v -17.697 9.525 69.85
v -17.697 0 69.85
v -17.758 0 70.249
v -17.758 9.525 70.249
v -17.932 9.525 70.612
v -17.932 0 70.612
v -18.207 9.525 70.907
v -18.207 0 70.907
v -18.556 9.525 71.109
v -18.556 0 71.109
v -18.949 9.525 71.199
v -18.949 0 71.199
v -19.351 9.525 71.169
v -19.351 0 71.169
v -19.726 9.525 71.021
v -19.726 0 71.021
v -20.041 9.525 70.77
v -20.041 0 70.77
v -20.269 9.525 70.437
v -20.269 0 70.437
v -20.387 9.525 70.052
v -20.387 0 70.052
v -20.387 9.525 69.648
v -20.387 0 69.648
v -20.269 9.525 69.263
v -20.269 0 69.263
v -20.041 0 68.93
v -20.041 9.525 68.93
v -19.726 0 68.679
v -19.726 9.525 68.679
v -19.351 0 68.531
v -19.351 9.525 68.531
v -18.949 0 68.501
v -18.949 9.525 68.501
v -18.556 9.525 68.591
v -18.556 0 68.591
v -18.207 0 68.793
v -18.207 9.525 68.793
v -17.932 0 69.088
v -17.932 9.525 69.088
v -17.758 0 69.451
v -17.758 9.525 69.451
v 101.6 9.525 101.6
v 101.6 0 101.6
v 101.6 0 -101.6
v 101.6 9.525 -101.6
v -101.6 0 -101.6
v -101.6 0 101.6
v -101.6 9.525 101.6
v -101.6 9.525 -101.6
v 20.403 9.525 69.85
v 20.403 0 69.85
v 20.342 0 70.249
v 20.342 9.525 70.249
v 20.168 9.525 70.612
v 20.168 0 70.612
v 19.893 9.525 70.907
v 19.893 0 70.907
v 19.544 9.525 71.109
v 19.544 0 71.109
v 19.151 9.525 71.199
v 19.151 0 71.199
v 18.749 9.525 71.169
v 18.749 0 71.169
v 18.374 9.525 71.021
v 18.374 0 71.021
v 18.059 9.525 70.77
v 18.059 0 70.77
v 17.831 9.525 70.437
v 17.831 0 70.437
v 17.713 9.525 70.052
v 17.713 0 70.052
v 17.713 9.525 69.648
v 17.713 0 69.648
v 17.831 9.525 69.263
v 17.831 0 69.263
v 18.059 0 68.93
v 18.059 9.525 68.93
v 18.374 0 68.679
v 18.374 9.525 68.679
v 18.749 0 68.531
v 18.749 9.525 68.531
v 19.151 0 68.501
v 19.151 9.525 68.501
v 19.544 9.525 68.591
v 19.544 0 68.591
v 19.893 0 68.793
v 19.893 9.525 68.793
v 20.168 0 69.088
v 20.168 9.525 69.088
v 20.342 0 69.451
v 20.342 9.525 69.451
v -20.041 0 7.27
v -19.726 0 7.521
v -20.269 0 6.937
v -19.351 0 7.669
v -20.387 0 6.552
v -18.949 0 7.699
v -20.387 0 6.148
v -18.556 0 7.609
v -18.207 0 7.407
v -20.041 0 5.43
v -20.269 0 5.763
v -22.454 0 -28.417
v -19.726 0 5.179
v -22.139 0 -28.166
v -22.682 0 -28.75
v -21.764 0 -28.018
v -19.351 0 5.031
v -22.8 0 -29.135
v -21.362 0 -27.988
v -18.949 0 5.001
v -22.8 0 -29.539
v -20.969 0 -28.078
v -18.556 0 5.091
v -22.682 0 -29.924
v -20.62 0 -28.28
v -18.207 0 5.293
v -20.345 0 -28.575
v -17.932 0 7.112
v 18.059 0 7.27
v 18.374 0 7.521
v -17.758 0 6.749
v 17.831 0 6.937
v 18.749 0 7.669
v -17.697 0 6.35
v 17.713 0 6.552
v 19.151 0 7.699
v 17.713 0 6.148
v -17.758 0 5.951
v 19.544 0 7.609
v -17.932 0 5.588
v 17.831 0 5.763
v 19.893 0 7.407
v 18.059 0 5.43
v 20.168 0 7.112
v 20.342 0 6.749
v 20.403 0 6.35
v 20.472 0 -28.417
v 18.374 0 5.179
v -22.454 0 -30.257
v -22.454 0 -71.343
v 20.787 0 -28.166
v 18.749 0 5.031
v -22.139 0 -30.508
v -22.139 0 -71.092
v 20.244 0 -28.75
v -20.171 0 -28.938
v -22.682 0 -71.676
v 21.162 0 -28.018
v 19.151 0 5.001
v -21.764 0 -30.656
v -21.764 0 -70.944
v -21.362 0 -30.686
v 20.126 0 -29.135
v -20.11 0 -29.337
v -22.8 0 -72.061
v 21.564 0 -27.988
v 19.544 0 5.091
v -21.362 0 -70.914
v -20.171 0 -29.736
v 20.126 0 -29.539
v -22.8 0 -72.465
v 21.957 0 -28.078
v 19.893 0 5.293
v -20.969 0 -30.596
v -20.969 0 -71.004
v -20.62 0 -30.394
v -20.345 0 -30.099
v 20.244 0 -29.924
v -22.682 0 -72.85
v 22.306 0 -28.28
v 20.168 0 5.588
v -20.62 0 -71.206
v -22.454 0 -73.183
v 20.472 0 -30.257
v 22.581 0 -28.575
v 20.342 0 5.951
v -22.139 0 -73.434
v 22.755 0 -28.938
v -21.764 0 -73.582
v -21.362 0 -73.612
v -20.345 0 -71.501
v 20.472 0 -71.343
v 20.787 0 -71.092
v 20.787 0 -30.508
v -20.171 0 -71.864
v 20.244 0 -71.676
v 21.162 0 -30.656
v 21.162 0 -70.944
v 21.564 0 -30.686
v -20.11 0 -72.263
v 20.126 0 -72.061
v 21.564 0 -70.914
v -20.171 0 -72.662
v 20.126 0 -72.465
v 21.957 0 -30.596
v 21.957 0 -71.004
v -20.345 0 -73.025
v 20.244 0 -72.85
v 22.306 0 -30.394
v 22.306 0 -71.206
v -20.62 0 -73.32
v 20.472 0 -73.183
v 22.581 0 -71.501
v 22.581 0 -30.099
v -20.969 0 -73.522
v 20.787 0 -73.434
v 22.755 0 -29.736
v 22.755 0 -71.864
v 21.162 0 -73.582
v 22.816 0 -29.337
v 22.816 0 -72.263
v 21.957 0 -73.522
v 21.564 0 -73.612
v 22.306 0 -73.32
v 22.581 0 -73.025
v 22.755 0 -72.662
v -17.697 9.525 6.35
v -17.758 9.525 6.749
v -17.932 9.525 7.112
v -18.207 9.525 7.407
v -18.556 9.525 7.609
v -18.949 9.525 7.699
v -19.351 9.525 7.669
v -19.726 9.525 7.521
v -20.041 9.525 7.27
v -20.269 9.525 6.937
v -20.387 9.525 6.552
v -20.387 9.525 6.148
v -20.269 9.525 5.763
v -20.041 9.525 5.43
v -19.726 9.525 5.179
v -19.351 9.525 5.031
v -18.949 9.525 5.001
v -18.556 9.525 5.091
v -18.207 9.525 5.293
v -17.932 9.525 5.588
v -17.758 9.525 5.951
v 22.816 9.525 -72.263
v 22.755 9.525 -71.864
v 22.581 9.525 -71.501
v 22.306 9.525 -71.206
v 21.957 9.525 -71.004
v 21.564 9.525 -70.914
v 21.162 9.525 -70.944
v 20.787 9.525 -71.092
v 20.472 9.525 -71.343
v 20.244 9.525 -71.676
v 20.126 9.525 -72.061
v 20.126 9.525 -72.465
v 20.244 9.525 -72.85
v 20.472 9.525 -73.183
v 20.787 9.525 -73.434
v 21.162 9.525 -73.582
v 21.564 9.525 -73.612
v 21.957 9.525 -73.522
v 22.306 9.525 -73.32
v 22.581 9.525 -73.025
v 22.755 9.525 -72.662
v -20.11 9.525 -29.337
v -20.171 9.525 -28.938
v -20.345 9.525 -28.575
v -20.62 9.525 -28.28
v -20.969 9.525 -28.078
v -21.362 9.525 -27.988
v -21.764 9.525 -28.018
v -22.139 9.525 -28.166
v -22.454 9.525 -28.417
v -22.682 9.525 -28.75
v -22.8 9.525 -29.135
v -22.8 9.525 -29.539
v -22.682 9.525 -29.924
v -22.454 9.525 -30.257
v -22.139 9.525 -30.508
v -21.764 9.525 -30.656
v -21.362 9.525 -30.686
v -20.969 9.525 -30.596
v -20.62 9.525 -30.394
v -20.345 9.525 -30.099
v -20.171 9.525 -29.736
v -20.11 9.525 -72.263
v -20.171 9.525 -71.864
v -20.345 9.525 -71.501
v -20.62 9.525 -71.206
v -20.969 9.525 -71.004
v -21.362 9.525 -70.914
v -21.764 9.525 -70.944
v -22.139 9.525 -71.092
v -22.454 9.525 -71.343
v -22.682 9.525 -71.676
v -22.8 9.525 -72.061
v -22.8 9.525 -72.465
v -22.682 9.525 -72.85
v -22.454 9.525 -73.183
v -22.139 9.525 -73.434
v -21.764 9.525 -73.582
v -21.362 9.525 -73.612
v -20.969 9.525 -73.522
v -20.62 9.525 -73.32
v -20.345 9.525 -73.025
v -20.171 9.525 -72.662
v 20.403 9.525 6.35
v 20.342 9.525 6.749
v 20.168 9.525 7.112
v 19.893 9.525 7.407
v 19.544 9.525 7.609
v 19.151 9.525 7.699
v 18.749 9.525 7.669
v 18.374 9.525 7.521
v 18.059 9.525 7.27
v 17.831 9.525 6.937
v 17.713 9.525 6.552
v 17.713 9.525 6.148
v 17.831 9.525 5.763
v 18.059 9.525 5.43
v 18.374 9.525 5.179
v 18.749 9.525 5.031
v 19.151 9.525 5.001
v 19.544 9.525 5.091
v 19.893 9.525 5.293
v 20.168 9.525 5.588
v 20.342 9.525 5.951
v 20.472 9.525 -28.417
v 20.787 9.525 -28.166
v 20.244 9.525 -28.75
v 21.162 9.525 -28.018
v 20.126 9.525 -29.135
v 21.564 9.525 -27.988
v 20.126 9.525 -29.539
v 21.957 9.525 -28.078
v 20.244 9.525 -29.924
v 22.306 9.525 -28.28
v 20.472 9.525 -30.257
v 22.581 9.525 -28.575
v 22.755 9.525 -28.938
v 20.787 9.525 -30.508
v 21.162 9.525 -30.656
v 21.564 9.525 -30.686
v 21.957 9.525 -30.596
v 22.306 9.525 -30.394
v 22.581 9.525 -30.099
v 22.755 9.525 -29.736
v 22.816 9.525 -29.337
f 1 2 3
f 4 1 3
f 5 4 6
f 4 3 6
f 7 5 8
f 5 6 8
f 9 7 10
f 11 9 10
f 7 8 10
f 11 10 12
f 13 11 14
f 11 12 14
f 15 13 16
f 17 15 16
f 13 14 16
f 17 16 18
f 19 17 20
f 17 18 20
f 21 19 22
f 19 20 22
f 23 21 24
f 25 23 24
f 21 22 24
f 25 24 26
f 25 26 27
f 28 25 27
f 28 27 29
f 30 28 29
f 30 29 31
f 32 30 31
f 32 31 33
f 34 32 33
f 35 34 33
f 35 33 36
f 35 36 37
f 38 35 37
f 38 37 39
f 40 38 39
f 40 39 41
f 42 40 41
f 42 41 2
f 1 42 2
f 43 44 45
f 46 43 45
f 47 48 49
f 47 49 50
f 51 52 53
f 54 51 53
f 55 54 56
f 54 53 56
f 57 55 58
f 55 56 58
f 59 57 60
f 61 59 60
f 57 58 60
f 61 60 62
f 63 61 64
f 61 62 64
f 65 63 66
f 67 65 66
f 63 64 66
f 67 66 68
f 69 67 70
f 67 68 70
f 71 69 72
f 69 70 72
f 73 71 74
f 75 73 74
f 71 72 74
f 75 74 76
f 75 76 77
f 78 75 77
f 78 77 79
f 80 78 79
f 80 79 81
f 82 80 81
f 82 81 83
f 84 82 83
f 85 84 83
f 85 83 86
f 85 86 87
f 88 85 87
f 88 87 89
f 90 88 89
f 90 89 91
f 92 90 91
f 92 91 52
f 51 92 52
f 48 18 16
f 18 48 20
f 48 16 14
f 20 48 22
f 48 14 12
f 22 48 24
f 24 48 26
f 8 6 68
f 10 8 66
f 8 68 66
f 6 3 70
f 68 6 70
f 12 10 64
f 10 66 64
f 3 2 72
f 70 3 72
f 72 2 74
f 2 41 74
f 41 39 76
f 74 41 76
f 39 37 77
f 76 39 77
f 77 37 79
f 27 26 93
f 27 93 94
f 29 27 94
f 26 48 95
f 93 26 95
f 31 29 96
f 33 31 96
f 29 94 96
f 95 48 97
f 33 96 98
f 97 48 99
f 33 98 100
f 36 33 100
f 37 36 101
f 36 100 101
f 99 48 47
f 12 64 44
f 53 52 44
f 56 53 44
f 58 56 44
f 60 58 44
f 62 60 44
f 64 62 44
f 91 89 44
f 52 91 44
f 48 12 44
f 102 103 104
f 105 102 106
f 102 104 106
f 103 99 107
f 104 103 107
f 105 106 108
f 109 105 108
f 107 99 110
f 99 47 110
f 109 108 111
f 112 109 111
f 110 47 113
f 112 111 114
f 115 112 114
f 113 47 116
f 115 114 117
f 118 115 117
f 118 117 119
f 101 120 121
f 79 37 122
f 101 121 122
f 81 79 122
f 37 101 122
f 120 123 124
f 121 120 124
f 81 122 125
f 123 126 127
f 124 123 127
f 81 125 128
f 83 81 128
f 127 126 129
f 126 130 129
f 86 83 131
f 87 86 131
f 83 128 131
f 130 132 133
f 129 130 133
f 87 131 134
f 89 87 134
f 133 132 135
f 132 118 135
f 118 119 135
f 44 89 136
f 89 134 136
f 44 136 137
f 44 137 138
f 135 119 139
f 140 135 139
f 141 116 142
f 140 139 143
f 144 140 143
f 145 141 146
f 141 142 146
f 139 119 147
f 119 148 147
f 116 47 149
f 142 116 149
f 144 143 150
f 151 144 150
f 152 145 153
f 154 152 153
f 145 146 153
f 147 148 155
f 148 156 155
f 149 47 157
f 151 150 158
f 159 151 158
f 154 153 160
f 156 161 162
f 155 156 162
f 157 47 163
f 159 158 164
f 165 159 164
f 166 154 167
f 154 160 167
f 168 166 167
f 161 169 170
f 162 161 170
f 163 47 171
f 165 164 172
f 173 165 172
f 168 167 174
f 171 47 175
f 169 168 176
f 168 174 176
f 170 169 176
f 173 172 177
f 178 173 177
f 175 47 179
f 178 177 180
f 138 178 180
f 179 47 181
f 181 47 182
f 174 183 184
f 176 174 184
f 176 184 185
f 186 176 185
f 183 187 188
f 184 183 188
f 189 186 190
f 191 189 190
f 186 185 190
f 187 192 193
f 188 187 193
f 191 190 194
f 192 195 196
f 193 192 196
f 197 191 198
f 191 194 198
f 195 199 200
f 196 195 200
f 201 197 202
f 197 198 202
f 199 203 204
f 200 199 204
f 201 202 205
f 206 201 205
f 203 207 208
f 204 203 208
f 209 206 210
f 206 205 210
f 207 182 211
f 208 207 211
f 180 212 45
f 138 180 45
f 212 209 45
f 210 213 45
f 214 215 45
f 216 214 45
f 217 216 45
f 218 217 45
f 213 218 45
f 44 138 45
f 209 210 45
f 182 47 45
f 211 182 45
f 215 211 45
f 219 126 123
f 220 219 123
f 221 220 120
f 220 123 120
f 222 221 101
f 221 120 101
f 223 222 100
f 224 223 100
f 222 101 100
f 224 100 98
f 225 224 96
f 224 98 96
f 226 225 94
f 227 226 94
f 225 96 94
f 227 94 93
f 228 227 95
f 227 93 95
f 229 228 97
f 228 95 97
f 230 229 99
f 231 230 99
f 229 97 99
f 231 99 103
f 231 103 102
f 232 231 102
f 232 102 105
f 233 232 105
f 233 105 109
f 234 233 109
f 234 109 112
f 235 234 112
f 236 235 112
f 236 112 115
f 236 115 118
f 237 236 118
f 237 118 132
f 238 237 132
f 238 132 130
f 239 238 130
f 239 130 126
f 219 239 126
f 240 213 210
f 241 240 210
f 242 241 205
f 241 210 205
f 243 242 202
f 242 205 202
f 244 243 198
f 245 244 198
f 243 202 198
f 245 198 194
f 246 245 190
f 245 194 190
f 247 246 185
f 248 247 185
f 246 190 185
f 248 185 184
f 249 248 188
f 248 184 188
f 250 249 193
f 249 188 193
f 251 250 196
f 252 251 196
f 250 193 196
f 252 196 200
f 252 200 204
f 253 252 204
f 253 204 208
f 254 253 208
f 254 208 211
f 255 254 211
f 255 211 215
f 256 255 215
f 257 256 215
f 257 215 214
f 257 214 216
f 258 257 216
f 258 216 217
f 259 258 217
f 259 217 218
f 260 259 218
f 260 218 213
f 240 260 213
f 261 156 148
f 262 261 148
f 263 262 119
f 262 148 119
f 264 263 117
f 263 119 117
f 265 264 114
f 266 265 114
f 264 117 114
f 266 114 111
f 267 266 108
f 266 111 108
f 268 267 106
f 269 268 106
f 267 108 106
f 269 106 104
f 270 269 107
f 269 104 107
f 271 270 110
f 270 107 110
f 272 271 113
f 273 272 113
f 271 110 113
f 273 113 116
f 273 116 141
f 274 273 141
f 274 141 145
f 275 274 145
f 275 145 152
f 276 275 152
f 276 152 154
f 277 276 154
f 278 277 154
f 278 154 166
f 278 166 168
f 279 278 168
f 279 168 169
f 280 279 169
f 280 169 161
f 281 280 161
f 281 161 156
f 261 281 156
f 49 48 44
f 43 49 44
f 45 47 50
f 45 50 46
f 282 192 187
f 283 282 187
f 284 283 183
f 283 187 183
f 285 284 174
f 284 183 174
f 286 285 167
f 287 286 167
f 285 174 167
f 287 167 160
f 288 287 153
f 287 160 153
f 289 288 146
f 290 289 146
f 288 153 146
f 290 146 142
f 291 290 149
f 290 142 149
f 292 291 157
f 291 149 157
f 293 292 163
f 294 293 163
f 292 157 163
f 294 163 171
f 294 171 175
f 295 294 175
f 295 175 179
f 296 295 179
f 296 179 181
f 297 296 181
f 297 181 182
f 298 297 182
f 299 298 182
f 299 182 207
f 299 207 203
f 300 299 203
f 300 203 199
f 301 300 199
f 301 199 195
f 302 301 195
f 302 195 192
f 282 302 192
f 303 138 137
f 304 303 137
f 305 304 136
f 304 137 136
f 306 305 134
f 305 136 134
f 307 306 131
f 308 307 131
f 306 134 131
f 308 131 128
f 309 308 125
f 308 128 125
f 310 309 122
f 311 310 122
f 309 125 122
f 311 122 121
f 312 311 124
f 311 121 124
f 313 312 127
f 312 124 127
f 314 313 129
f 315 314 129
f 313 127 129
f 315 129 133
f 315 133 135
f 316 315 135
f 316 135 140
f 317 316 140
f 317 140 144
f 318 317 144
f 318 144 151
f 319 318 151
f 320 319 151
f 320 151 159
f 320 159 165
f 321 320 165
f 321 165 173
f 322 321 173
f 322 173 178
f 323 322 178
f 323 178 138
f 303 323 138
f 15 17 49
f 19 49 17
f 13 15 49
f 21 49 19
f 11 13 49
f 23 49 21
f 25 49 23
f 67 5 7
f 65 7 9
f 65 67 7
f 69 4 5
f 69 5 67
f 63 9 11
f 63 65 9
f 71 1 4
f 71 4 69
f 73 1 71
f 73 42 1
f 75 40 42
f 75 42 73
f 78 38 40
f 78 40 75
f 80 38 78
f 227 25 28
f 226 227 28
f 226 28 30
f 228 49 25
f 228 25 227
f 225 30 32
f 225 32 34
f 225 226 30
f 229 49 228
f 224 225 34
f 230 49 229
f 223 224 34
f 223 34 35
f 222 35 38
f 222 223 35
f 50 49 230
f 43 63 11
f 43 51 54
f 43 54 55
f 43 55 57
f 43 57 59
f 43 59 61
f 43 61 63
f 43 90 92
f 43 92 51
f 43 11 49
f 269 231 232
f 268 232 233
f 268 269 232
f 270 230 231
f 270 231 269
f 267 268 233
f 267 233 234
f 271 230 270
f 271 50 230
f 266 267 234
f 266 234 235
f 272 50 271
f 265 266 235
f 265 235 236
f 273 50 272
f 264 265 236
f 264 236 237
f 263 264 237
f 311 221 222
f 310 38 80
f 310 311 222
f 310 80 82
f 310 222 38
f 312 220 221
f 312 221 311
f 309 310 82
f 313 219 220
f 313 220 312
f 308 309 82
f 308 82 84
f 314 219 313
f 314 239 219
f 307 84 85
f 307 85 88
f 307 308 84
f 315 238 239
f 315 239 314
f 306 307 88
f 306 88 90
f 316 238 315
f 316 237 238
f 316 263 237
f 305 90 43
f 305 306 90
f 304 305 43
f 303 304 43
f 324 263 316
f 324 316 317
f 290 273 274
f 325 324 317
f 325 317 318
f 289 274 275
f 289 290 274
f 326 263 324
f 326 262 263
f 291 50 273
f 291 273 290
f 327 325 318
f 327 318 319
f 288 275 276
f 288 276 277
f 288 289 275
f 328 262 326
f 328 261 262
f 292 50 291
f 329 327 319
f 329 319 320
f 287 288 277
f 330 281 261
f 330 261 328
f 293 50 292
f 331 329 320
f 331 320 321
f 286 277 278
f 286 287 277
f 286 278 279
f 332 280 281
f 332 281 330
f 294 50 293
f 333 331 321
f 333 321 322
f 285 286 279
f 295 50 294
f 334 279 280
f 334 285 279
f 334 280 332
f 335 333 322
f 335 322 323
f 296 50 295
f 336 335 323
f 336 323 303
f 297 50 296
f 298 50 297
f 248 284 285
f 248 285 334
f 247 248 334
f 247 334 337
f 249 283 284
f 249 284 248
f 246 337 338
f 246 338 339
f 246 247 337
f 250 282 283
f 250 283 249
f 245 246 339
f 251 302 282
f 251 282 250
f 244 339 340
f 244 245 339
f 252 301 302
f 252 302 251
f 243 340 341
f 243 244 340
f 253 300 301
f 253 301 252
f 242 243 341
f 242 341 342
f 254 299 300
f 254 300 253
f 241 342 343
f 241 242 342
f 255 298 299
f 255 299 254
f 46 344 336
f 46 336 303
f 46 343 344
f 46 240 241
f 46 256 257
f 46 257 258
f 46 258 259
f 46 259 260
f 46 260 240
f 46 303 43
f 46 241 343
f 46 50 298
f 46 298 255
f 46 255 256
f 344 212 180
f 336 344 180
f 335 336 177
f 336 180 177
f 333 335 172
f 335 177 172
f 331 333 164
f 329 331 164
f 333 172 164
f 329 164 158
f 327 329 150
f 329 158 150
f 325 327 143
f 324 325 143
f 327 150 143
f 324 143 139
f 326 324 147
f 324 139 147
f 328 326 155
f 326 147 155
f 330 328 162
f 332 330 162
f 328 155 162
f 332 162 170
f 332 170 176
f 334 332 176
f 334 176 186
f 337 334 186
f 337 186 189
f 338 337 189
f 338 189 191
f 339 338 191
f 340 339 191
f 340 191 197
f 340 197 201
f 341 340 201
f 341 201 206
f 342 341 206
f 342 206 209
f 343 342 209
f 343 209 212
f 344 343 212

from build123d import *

# Parameters (mm, degrees)
SKETCH1_W             = 203.2
SKETCH1_H             = 203.2
BOSS_EXTRUDE1_DEPTH   = 9.525
F_6_32_TAPPED_HOLE1_D = 2.7051
F_6_32_TAPPED_HOLE2_D = 2.7051


with BuildPart() as part:
    # Sketch1 → Boss-Extrude1 (new body)
    with BuildSketch(Plane(origin=(0, 0, 0), x_dir=(1, 0, 0), z_dir=(0, 1, 0))):
        Rectangle(SKETCH1_W, SKETCH1_H)
    extrude(amount=BOSS_EXTRUDE1_DEPTH)

    # #6-32 Tapped Hole1 (through all)
    with Locations(Plane(origin=(0, 9.525, 0), x_dir=(-1, 0, 0), z_dir=(0, 1, 0))):
        with Locations((21.463, -72.263), (-21.463, -72.263), (-21.463, -29.337), (21.463, -29.337)):
            Hole(F_6_32_TAPPED_HOLE1_D / 2)

    # #6-32 Tapped Hole2 (through all)
    with Locations(Plane(origin=(0, 9.525, 0), x_dir=(-1, 0, 0), z_dir=(0, 1, 0))):
        with Locations((19.05, 6.35), (-19.05, 6.35), (-19.05, 69.85), (19.05, 69.85)):
            Hole(F_6_32_TAPPED_HOLE2_D / 2)


solid = part.part
